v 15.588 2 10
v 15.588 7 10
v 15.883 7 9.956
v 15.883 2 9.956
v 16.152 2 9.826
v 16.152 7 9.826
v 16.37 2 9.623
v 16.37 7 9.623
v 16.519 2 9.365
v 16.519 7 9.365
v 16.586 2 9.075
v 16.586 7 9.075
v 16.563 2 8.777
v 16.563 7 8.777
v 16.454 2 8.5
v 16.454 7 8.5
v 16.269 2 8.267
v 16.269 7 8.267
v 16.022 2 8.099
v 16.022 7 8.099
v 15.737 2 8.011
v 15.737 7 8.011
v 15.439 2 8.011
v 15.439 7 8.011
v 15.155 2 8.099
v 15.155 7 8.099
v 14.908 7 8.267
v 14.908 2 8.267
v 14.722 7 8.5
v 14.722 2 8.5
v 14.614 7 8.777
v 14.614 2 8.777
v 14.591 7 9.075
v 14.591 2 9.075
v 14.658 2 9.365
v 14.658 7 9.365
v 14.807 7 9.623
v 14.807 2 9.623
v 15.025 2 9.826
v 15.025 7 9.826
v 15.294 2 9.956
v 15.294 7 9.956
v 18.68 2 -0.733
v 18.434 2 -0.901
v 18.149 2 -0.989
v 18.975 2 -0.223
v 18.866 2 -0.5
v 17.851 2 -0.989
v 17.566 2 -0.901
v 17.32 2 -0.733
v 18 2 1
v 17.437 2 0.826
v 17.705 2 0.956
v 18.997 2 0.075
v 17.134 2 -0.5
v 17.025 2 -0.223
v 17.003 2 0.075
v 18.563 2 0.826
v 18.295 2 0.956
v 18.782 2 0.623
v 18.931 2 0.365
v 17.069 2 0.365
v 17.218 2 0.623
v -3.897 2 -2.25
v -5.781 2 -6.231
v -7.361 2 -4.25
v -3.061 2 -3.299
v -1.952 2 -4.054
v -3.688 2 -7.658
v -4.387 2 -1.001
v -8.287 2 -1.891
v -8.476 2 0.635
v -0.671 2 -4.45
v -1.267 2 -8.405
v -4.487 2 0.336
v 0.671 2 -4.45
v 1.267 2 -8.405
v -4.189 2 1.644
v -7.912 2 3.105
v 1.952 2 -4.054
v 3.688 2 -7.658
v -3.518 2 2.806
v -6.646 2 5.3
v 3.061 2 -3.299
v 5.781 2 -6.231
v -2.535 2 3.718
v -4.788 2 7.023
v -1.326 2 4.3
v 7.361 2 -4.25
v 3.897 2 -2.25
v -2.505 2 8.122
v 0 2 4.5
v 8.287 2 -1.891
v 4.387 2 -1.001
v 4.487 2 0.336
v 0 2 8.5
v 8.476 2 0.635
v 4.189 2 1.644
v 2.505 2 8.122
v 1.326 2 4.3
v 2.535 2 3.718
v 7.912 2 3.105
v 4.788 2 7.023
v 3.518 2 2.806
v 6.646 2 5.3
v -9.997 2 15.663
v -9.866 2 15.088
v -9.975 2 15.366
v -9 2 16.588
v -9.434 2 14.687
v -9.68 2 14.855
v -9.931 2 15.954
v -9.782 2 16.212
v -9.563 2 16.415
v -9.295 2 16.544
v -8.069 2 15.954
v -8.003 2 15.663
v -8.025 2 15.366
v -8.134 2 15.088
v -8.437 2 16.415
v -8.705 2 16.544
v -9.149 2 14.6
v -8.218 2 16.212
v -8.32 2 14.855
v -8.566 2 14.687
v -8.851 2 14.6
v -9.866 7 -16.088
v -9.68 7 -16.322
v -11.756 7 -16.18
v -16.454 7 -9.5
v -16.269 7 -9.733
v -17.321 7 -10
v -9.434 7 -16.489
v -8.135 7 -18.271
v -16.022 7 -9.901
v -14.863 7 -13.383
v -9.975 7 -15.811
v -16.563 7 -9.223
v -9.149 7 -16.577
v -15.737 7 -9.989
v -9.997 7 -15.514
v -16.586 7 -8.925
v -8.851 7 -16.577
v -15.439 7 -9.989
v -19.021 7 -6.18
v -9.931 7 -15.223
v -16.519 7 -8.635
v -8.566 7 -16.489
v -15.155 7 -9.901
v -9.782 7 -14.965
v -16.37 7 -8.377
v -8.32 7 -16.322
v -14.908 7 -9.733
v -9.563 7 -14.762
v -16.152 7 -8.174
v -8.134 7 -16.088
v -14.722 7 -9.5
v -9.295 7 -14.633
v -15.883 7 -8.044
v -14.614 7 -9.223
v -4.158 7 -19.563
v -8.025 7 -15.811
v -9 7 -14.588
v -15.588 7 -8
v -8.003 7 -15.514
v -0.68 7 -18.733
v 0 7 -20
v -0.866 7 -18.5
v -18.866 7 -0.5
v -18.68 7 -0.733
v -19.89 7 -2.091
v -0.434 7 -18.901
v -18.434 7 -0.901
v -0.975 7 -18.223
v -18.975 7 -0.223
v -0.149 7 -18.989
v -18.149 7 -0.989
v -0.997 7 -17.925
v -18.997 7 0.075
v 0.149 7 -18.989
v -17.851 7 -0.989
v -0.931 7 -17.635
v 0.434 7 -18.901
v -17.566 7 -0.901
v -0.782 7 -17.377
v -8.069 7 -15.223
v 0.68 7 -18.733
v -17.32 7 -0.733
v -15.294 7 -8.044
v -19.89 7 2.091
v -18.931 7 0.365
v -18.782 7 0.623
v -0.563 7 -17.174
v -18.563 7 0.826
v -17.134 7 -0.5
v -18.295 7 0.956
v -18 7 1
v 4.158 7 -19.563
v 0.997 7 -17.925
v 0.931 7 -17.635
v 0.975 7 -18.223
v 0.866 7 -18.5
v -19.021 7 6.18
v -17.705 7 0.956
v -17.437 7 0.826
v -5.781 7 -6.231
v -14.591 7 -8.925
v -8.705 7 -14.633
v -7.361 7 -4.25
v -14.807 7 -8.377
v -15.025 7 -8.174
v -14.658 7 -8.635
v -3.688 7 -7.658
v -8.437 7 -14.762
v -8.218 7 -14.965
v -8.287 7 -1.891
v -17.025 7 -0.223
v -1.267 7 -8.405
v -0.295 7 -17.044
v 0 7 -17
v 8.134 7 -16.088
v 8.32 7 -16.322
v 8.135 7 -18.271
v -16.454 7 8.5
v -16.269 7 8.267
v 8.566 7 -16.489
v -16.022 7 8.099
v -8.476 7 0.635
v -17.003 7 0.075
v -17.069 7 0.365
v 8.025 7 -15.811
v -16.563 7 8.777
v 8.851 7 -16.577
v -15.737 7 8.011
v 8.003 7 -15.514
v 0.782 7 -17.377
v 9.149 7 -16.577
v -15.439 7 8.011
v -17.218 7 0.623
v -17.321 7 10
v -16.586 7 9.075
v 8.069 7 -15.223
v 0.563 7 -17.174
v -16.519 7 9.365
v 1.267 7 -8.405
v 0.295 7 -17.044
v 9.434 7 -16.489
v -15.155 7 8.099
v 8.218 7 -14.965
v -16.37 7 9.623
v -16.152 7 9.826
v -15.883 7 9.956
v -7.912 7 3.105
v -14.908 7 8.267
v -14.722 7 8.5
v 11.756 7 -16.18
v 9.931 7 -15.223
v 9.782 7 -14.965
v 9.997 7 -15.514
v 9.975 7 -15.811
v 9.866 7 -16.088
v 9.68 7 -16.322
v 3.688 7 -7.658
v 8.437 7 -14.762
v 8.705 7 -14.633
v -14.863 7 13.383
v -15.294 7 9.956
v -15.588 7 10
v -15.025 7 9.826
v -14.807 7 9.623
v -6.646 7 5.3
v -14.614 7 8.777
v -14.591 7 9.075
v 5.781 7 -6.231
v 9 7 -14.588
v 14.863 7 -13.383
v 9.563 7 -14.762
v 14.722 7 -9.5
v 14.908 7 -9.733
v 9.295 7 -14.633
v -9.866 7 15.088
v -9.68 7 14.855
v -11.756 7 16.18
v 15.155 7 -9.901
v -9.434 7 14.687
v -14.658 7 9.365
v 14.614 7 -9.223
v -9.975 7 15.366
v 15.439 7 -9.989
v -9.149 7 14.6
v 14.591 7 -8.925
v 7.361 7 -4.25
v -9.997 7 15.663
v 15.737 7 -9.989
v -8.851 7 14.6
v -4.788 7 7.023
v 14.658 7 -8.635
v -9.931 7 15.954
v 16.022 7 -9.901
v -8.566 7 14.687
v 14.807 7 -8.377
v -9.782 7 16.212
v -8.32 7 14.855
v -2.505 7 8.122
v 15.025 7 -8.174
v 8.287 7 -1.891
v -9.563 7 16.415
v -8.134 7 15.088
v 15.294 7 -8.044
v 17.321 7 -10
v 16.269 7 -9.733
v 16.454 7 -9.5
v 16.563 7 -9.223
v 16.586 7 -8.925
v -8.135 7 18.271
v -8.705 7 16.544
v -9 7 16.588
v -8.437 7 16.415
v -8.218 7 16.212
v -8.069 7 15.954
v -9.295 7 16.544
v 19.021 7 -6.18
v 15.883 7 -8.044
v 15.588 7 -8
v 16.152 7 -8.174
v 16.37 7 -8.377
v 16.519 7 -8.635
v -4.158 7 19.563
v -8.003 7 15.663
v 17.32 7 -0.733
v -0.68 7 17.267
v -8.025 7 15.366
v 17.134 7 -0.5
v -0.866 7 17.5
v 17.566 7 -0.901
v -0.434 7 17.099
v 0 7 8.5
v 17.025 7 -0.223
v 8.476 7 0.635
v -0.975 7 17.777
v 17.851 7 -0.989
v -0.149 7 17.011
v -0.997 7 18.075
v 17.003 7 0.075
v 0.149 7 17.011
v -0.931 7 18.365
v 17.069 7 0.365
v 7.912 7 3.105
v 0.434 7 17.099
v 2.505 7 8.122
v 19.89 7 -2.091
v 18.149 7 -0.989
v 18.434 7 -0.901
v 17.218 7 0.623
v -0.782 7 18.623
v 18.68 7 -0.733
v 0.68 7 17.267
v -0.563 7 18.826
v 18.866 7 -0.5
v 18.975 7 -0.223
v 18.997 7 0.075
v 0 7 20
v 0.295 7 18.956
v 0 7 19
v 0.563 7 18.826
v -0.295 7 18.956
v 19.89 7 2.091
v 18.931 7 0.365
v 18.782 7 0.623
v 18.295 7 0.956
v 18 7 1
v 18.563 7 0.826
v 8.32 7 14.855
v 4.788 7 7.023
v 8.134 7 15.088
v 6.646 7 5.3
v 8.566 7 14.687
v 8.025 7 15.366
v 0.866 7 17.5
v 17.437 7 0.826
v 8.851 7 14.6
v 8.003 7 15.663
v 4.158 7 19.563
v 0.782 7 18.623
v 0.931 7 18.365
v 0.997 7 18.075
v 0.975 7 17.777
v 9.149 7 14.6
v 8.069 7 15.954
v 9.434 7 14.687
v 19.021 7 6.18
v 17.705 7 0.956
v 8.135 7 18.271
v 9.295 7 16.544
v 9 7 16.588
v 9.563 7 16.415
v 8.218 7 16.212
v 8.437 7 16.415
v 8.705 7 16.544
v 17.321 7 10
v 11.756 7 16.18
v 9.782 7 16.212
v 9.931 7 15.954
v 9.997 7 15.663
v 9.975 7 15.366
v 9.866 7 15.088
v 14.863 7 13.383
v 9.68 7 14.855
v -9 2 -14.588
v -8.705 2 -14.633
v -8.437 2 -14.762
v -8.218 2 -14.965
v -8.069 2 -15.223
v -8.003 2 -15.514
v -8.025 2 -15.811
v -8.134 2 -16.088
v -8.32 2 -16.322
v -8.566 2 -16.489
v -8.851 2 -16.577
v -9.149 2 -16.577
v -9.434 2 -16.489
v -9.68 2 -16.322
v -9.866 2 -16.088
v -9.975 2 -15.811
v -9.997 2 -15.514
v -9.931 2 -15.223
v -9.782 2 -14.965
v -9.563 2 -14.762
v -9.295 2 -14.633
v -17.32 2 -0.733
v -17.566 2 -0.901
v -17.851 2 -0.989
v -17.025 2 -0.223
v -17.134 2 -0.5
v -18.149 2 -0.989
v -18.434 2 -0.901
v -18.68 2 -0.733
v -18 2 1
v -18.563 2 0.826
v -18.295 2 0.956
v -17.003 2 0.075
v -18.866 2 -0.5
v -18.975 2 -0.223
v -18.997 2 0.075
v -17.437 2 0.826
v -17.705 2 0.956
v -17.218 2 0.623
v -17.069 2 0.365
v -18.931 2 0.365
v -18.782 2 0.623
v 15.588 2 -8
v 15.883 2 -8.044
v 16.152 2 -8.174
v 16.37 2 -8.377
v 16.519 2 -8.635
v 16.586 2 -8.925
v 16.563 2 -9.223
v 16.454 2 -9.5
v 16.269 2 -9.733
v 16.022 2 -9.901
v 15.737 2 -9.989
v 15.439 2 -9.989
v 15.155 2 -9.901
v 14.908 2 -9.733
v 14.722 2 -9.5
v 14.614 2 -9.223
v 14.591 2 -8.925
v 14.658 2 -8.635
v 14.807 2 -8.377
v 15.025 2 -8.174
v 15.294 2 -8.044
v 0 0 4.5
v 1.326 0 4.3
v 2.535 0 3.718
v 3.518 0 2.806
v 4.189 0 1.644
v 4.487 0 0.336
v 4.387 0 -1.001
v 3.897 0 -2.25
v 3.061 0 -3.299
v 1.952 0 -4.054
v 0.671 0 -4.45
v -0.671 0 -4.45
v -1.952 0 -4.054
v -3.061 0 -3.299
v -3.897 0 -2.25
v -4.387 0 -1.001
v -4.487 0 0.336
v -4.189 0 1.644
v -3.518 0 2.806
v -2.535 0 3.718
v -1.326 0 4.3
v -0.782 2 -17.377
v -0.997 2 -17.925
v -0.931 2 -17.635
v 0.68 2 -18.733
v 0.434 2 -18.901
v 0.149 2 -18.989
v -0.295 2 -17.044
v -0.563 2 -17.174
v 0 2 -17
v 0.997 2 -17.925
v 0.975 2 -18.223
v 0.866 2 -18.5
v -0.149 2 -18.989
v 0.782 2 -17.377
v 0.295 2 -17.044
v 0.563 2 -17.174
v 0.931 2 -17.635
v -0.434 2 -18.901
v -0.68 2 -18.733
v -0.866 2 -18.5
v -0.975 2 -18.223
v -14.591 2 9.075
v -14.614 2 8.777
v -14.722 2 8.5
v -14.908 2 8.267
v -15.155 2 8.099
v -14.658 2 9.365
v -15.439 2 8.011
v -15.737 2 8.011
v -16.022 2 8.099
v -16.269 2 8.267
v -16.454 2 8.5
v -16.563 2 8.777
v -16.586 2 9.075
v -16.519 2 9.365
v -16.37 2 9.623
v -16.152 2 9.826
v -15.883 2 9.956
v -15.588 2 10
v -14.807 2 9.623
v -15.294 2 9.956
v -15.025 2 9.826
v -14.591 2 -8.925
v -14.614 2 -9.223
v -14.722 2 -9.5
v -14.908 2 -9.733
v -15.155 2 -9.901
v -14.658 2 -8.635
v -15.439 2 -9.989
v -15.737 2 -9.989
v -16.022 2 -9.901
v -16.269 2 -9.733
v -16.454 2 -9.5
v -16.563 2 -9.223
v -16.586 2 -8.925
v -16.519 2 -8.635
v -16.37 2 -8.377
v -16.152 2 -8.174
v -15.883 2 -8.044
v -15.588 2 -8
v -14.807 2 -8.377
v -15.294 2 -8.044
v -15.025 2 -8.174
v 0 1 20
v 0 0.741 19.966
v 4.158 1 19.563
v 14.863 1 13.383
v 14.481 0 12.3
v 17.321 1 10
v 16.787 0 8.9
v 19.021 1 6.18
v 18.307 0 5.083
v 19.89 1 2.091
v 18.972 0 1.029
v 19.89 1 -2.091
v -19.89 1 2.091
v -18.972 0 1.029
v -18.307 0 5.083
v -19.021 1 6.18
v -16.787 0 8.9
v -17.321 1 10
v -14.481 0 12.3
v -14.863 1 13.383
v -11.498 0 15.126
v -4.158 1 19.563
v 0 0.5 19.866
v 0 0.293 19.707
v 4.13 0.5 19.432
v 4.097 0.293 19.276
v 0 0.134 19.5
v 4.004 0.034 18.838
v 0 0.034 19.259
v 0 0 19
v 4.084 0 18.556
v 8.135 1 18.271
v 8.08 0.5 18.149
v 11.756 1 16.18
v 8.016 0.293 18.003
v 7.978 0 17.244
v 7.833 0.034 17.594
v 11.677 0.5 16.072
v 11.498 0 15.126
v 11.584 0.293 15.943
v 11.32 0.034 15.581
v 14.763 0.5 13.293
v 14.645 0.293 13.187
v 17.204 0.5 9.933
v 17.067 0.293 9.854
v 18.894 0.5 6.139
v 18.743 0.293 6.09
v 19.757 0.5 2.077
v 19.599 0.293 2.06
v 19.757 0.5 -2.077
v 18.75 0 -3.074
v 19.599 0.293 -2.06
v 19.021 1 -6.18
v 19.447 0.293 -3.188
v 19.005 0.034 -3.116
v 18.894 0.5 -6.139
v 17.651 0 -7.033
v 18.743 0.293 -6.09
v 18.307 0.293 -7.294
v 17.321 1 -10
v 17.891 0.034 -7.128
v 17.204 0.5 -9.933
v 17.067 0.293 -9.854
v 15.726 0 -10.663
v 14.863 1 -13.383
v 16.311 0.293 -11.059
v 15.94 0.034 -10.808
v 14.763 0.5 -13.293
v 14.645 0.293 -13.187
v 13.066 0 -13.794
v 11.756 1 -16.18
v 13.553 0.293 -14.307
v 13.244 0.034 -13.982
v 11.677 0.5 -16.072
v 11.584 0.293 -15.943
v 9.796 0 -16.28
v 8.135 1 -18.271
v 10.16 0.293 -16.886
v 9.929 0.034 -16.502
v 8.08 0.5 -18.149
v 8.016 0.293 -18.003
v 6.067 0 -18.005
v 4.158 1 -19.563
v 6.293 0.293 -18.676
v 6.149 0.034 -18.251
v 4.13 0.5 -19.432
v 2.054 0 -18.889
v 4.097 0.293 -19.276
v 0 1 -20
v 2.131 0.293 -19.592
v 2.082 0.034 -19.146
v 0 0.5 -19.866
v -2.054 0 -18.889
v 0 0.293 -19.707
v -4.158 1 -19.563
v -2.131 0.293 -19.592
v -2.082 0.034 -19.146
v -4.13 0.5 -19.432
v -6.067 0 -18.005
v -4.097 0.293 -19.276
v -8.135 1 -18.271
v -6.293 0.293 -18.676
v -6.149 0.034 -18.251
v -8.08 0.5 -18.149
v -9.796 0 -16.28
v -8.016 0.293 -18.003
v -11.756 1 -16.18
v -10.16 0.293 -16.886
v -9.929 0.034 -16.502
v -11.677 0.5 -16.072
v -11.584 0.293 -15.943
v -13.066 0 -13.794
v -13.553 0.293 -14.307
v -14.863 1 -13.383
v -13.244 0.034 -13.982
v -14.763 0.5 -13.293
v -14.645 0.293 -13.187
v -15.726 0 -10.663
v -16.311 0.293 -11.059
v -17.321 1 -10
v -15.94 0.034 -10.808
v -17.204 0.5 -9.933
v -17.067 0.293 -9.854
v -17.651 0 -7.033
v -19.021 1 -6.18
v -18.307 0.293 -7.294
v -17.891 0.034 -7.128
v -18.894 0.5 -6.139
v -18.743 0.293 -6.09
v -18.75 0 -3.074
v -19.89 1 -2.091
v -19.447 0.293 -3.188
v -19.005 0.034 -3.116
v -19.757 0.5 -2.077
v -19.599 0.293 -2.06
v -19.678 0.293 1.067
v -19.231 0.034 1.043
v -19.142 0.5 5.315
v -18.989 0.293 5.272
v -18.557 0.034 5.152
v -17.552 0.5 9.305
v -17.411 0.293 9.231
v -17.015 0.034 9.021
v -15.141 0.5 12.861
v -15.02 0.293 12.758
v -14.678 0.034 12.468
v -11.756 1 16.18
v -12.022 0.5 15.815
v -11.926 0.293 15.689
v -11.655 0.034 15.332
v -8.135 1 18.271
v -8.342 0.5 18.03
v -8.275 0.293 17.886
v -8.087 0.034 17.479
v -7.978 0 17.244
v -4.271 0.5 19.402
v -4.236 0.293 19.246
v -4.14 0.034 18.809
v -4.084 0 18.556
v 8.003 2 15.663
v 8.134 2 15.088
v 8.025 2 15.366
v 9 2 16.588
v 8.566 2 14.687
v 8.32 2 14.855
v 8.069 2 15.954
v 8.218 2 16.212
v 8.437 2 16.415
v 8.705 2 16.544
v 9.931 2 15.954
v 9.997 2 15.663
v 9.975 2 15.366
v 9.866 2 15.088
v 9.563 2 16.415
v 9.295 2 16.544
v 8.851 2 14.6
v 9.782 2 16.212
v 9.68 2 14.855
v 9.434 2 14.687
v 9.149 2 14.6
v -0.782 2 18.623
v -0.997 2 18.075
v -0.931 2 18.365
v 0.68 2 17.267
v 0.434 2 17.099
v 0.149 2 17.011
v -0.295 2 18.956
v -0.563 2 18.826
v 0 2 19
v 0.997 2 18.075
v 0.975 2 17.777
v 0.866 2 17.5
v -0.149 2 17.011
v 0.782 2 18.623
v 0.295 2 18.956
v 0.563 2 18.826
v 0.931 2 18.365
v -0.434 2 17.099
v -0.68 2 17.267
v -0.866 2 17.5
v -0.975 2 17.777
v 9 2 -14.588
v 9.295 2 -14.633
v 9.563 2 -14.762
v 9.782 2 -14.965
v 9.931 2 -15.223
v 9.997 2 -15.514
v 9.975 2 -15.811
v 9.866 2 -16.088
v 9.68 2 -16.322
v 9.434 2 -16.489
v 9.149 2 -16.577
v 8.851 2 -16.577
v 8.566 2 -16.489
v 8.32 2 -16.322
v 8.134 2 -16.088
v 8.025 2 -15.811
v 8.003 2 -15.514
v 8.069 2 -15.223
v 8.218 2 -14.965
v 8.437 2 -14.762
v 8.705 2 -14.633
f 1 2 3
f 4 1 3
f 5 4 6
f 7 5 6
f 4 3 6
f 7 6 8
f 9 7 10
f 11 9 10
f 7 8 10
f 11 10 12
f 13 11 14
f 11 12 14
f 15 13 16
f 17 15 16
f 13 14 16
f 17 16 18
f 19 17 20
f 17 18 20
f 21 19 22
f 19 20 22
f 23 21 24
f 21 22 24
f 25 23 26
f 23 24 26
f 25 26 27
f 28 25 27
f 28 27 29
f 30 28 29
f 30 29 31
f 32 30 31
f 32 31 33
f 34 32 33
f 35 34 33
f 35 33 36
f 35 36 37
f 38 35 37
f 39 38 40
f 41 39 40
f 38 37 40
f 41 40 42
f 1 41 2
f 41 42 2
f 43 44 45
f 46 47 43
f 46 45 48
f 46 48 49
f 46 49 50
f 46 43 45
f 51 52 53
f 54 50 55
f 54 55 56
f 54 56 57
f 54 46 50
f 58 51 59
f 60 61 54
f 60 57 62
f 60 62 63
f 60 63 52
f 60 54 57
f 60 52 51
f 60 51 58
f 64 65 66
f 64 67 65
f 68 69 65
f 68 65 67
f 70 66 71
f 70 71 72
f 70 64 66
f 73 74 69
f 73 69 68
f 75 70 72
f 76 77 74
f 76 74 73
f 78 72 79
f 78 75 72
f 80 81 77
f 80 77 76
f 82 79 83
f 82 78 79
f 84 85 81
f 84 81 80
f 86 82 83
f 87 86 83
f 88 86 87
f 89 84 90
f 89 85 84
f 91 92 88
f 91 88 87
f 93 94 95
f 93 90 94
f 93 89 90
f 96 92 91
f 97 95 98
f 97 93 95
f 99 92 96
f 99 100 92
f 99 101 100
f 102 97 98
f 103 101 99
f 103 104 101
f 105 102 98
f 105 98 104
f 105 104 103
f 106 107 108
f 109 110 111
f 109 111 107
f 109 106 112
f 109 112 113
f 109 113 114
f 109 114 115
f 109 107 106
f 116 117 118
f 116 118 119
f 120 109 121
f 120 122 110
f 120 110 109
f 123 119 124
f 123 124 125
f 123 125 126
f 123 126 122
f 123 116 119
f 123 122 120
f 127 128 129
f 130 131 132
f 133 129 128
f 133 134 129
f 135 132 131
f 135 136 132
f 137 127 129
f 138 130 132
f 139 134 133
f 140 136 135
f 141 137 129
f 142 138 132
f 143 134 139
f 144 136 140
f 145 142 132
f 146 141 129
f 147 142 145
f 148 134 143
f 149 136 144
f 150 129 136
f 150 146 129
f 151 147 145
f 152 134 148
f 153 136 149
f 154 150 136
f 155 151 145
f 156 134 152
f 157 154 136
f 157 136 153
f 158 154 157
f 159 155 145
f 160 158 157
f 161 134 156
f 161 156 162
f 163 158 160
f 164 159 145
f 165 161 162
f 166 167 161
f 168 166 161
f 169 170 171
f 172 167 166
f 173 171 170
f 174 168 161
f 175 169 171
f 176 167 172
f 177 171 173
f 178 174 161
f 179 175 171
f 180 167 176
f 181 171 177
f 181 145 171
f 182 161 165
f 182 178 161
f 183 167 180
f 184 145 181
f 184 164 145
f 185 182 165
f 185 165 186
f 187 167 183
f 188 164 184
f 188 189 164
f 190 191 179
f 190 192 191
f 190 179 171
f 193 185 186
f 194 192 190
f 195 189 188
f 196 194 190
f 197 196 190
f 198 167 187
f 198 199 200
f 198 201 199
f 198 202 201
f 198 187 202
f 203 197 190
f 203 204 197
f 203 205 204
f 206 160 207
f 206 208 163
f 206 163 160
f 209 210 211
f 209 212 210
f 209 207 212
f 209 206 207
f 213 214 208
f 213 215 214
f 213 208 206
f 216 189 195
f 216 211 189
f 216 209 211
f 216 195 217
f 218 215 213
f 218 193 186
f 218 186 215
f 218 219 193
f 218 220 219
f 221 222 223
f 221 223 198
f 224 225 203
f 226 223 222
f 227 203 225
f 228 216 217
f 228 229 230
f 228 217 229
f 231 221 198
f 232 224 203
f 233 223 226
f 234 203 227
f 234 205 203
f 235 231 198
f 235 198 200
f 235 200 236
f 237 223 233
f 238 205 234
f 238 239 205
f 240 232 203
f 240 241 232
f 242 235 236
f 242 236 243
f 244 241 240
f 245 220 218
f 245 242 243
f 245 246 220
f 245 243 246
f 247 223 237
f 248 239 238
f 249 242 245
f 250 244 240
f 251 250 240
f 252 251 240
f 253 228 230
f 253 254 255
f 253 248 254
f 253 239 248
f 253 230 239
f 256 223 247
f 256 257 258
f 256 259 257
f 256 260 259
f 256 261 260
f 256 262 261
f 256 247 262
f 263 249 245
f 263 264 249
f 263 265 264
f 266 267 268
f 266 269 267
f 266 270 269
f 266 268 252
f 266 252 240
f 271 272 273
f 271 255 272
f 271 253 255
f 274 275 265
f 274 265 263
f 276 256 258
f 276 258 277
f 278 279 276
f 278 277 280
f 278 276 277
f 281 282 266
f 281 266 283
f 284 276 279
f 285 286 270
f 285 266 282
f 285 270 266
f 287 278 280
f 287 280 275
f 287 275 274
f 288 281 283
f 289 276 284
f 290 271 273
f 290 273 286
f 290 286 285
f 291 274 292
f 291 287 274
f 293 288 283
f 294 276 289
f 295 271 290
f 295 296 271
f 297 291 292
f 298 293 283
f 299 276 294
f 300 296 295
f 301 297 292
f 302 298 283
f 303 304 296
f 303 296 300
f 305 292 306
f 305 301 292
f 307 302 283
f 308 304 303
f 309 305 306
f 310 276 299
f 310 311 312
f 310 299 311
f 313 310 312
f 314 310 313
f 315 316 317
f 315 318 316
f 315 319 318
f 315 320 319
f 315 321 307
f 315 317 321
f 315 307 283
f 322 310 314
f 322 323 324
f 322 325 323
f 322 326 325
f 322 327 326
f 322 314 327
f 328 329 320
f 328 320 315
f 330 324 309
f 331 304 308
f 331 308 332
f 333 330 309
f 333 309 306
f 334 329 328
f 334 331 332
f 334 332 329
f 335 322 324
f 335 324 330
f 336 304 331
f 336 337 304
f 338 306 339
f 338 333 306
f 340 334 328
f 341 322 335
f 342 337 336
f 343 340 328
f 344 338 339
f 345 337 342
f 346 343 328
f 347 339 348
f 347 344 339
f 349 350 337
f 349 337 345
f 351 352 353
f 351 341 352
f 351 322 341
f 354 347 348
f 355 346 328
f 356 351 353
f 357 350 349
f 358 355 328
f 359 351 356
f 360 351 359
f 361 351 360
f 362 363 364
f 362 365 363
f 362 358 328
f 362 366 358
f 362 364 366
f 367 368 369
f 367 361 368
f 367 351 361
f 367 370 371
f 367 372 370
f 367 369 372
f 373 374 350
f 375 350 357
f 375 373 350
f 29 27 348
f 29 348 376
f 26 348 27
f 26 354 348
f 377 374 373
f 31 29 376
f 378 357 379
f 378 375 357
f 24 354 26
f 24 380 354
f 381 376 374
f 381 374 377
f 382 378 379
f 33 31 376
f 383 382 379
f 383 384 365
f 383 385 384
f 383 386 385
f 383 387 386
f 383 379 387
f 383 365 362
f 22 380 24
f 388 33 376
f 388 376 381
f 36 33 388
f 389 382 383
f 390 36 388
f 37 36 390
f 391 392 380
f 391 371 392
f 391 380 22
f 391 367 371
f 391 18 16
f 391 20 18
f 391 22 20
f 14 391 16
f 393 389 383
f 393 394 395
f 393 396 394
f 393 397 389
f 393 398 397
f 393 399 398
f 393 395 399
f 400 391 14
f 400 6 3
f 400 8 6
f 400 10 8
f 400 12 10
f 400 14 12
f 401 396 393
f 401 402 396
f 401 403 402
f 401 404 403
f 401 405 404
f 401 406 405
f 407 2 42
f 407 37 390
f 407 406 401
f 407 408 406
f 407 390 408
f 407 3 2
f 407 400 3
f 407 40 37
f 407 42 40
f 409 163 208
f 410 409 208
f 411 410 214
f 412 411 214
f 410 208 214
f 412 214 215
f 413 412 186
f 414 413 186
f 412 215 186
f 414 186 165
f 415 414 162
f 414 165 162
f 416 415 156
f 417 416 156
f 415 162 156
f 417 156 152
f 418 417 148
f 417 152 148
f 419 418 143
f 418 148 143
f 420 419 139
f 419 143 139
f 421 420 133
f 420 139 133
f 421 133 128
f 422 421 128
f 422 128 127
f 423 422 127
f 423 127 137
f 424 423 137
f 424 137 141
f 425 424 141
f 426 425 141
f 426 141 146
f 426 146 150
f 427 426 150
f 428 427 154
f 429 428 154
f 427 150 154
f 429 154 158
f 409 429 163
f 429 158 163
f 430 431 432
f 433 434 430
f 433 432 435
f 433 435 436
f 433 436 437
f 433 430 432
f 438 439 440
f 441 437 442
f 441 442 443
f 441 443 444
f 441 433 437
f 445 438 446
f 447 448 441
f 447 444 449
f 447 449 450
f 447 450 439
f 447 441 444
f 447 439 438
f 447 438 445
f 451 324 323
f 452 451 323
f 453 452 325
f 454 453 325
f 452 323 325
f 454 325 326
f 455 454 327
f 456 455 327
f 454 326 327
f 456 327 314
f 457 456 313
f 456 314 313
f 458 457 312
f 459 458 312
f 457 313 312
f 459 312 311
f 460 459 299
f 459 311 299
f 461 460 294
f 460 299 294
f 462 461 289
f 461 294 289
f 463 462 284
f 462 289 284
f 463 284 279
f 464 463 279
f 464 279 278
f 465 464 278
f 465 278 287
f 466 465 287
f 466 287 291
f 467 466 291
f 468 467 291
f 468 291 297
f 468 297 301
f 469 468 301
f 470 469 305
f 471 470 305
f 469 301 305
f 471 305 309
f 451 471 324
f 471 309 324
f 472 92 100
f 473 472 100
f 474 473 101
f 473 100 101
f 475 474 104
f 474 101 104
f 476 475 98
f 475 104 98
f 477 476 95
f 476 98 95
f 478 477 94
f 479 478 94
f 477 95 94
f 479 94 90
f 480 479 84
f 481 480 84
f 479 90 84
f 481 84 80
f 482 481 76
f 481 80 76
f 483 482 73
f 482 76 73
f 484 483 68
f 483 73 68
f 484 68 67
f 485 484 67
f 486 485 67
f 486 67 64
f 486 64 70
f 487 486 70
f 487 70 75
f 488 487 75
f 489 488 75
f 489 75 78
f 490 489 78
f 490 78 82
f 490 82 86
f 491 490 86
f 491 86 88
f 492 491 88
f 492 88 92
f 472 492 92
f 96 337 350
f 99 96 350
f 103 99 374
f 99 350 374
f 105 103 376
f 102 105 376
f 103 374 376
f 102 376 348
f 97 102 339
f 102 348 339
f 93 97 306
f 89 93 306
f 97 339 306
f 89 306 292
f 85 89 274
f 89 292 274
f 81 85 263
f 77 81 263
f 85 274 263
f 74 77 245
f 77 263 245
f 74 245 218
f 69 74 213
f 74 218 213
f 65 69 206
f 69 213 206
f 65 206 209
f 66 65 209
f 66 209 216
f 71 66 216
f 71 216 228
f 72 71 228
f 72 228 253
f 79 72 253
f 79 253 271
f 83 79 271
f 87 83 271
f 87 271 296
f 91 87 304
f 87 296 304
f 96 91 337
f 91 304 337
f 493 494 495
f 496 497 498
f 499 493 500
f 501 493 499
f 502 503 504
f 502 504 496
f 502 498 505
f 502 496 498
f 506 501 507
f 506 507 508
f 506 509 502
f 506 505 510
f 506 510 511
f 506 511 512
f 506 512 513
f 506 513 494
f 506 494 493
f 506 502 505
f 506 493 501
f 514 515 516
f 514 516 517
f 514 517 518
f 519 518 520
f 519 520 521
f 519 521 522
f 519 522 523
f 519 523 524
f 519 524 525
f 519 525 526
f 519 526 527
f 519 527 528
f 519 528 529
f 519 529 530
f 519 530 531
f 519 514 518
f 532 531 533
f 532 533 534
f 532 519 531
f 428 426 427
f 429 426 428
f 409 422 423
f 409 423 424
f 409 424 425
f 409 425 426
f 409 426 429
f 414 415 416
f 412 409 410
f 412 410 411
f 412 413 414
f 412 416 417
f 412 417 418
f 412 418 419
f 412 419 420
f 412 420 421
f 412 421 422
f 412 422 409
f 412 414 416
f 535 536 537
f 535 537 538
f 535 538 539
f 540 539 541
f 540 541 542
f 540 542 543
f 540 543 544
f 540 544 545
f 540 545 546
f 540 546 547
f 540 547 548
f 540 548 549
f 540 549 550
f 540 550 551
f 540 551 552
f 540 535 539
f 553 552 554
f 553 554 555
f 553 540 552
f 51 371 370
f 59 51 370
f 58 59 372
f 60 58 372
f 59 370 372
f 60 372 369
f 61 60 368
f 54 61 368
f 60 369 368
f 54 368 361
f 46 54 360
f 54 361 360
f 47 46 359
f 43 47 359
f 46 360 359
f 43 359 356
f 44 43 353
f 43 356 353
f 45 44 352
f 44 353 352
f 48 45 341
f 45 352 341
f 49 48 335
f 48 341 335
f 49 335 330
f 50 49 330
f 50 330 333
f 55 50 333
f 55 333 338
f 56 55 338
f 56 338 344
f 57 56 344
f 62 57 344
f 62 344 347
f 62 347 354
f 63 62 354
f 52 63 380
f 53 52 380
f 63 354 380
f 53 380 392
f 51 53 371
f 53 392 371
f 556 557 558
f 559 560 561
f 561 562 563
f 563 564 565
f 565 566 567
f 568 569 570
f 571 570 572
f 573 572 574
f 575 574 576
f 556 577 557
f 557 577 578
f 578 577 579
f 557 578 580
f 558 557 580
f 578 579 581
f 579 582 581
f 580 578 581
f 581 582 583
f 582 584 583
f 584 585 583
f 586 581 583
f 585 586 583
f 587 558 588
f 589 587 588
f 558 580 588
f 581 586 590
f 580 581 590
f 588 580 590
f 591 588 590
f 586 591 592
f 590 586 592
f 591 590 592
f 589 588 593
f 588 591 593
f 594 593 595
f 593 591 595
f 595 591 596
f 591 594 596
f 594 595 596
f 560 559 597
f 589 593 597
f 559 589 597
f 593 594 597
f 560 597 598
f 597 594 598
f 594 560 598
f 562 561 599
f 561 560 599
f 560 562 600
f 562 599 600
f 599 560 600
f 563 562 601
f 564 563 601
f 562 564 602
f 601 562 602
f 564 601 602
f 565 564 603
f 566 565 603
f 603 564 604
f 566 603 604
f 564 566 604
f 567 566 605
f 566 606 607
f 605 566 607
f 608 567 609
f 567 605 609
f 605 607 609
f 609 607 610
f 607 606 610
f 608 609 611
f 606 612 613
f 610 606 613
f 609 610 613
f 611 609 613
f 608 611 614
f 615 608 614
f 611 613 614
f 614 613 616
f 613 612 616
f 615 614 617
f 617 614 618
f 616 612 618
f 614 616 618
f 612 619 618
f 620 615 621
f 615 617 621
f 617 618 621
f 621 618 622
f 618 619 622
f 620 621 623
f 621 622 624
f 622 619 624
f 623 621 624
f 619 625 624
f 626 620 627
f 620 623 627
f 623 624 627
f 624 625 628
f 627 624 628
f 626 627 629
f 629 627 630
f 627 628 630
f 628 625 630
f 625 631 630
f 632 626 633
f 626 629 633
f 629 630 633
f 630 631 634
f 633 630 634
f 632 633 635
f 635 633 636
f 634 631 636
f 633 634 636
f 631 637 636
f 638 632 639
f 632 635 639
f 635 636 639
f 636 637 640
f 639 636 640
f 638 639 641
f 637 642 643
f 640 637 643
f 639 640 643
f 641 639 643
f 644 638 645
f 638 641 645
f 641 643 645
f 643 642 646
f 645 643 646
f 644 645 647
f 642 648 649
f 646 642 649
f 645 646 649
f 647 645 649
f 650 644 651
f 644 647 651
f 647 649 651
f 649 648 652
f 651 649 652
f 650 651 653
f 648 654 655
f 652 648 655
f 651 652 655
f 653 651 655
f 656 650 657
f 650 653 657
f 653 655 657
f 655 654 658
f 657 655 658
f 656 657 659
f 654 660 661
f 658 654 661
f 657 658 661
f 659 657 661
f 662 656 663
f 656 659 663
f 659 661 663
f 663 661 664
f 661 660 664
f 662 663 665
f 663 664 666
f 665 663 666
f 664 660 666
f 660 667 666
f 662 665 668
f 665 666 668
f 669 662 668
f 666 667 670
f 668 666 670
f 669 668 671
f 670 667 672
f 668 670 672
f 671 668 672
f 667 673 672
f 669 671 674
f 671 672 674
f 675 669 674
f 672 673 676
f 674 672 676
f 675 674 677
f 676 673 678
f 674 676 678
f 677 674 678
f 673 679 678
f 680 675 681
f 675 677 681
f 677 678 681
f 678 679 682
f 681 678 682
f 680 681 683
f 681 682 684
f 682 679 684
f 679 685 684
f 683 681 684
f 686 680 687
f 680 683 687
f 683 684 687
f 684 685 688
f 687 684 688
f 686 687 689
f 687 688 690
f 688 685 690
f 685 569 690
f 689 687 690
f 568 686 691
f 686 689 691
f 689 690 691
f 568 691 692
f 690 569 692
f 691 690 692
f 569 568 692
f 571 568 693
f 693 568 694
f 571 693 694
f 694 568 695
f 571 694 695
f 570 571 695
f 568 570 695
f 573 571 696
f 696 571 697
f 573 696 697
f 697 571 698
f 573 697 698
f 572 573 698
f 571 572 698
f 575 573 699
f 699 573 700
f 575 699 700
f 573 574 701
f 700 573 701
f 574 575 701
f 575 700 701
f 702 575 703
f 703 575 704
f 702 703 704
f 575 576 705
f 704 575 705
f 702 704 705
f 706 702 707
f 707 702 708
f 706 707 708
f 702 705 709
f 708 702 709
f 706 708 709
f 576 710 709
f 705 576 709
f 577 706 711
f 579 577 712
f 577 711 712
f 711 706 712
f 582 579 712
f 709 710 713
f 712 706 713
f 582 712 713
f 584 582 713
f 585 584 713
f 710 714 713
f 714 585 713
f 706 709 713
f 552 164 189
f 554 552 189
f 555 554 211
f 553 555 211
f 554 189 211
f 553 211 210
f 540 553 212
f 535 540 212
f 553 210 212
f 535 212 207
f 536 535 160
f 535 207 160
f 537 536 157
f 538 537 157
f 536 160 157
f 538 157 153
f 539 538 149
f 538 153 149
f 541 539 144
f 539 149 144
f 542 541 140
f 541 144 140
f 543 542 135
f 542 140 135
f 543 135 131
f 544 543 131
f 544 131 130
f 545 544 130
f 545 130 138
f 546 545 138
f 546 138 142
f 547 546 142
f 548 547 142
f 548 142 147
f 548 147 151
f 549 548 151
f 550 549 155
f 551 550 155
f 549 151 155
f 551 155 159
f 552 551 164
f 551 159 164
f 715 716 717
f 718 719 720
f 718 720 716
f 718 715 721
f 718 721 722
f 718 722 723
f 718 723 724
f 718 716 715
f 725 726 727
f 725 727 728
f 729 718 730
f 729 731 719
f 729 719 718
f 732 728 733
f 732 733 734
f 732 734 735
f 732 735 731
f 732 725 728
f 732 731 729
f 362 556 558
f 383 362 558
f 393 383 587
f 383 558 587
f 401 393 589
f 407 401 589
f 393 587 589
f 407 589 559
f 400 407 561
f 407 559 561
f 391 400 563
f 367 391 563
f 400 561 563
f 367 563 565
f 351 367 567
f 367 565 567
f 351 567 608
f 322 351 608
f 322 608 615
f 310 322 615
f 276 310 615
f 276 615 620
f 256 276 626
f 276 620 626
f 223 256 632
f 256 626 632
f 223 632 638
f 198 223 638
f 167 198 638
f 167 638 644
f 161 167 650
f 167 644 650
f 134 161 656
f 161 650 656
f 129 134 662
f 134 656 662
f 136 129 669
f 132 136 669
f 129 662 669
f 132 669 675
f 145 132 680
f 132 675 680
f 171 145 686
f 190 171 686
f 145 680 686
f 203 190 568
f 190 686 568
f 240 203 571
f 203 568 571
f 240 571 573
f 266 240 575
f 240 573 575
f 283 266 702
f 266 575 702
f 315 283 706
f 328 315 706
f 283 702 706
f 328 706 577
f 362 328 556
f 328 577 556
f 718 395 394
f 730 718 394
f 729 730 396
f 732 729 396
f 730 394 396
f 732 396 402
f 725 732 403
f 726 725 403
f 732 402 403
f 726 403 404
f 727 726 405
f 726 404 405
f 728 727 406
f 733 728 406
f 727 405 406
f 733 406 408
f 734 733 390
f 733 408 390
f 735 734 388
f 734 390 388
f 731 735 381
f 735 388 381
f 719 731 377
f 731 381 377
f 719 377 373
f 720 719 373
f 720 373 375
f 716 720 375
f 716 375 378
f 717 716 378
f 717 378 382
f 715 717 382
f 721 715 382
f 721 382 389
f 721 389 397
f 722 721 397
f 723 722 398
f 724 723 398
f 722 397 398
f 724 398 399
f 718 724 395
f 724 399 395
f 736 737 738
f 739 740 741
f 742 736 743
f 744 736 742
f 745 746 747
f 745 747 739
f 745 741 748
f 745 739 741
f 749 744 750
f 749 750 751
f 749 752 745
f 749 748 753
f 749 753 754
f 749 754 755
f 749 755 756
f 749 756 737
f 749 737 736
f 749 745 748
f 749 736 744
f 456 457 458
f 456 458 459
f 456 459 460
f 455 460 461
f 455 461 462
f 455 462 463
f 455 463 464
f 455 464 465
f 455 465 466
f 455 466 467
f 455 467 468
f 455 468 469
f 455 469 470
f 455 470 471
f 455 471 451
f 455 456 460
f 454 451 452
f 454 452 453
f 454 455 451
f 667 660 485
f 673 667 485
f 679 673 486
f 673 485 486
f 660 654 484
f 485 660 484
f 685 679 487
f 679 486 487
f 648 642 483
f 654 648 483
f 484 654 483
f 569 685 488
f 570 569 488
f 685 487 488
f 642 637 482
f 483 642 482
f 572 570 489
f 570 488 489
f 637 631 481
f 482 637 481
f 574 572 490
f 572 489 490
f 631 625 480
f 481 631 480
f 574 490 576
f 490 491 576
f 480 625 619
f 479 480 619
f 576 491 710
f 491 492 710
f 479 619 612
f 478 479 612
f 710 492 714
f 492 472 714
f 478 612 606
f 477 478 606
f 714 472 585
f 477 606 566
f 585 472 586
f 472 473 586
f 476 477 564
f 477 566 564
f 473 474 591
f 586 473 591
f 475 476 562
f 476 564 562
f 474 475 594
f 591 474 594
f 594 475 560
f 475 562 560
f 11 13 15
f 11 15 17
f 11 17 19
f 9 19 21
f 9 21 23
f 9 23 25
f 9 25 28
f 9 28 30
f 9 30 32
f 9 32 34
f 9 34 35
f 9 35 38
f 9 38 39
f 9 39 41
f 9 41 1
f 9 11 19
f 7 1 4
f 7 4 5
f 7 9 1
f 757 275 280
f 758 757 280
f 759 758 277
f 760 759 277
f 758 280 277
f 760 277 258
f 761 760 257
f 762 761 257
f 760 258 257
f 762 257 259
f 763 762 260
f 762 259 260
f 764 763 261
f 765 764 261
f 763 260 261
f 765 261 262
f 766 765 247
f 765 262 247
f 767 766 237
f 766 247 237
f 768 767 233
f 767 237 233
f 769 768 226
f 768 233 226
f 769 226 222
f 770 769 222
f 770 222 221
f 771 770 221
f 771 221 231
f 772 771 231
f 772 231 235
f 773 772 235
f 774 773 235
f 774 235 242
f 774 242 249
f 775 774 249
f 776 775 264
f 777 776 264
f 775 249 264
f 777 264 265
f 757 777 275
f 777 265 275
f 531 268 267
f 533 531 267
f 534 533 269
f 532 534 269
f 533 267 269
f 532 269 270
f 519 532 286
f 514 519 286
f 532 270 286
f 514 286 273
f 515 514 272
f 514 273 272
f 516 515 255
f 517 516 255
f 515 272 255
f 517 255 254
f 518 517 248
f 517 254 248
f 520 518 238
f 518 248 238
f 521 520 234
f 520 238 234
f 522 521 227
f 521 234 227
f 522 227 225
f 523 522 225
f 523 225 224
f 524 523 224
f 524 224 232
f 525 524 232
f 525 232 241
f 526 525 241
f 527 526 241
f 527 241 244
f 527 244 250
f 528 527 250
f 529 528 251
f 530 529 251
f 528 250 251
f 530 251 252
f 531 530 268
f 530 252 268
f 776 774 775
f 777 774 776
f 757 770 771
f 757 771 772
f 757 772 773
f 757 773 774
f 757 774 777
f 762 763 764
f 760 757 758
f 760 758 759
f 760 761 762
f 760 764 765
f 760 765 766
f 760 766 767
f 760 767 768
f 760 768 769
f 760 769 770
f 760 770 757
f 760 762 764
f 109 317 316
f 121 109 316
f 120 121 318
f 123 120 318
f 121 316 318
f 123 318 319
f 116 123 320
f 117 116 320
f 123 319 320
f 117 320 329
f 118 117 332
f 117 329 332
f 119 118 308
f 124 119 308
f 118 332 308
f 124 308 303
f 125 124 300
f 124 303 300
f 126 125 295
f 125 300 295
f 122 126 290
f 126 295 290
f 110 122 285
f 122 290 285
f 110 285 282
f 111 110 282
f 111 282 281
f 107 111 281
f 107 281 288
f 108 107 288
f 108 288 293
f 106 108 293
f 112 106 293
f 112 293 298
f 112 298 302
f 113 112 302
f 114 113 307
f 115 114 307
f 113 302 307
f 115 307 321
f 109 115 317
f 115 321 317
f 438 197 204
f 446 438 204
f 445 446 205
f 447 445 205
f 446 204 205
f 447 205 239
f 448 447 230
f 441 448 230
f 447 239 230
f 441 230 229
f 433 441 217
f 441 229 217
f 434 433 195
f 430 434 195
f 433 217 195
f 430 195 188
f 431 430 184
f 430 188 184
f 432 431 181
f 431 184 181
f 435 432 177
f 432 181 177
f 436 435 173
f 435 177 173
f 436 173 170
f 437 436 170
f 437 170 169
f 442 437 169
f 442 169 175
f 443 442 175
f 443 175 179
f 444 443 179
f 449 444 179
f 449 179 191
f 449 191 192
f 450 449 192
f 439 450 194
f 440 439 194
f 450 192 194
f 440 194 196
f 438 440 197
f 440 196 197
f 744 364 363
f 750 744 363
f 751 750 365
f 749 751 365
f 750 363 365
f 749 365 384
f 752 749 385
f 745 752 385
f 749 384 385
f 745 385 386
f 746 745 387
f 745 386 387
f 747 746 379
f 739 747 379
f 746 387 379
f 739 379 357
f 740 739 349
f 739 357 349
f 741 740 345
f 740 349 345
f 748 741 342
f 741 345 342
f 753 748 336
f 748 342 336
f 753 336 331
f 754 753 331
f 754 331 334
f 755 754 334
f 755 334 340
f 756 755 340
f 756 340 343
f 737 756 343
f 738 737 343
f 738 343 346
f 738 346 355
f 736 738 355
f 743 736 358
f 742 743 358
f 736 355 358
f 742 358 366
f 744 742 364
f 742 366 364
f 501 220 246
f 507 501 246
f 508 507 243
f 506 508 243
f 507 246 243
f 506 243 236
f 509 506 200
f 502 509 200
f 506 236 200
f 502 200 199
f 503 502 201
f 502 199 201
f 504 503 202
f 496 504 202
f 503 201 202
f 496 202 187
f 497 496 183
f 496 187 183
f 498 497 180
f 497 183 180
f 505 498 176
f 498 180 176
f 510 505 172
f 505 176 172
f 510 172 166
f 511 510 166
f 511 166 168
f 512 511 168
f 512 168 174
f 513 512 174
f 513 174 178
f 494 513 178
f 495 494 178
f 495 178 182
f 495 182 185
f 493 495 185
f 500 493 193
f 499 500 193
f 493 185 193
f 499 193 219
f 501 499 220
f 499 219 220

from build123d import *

# Parameters (mm, degrees)
SKETCH1_R           = 20
BOSS_EXTRUDE1_DEPTH = 7
SKETCH2_R           = 8.5
CUT_EXTRUDE1_DEPTH  = 5
SKETCH3_R           = 4.5
CUT_EXTRUDE2_DEPTH  = 29.722813233
SKETCH4_R           = 1
CUT_EXTRUDE3_DEPTH  = 5
FILLET1_R           = 1


with BuildPart() as part:
    # Sketch1 → Boss-Extrude1 (new body)
    with BuildSketch(Plane(origin=(0, 0, 0), x_dir=(1, 0, 0), z_dir=(0, 1, 0))):
        with Locations(Location((0, 0, 0), (0, 0, 270))):
            Circle(SKETCH1_R)
    extrude(amount=BOSS_EXTRUDE1_DEPTH)

    # Sketch2 → Cut-Extrude1 (cut)
    with BuildSketch(Plane(origin=(0, 7, 0), x_dir=(1, 0, 0), z_dir=(0, 1, 0))):
        with Locations(Location((0, 0, 0), (0, 0, 270))):
            Circle(SKETCH2_R)
    extrude(amount=-CUT_EXTRUDE1_DEPTH, mode=Mode.SUBTRACT)

    # Sketch3 → Cut-Extrude2 (cut, through all)
    with BuildSketch(Plane(origin=(0, 2, 0), x_dir=(1, 0, 0), z_dir=(0, 1, 0))):
        with Locations(Location((0, 0, 0), (0, 0, 270))):
            Circle(SKETCH3_R)
    extrude(amount=-CUT_EXTRUDE2_DEPTH, mode=Mode.SUBTRACT)

    # Sketch4 → Cut-Extrude3 (cut)
    with BuildSketch(Plane(origin=(0, 7, 0), x_dir=(1, 0, 0), z_dir=(0, 1, 0))):
        with Locations(Location((0, 18, 0), (0, 0, 270))):
            Circle(SKETCH4_R)
        with Locations(Location((9, 15.588457268, 0), (0, 0, 270))):
            Circle(SKETCH4_R)
        with Locations(Location((15.588457268, 9, 0), (0, 0, 270))):
            Circle(SKETCH4_R)
        with Locations(Location((18, 0, 0), (0, 0, 270))):
            Circle(SKETCH4_R)
        with Locations(Location((15.588457268, -9, 0), (0, 0, 270))):
            Circle(SKETCH4_R)
        with Locations(Location((9, -15.588457268, 0), (0, 0, 270))):
            Circle(SKETCH4_R)
        with Locations(Location((0, -18, 0), (0, 0, 270))):
            Circle(SKETCH4_R)
        with Locations(Location((-9, -15.588457268, 0), (0, 0, 270))):
            Circle(SKETCH4_R)
        with Locations(Location((-15.588457268, -9, 0), (0, 0, 270))):
            Circle(SKETCH4_R)
        with Locations(Location((-18, 0, 0), (0, 0, 270))):
            Circle(SKETCH4_R)
        with Locations(Location((-15.588457268, 9, 0), (0, 0, 270))):
            Circle(SKETCH4_R)
        with Locations(Location((-9, 15.588457268, 0), (0, 0, 270))):
            Circle(SKETCH4_R)
    extrude(amount=-CUT_EXTRUDE3_DEPTH, mode=Mode.SUBTRACT)

    # Fillet1
    fillet1_edges = [part.edges().sort_by_distance(p)[0] for p in [
        (0, 0, -20),
    ]]
    fillet(fillet1_edges, radius=FILLET1_R)


solid = part.part
